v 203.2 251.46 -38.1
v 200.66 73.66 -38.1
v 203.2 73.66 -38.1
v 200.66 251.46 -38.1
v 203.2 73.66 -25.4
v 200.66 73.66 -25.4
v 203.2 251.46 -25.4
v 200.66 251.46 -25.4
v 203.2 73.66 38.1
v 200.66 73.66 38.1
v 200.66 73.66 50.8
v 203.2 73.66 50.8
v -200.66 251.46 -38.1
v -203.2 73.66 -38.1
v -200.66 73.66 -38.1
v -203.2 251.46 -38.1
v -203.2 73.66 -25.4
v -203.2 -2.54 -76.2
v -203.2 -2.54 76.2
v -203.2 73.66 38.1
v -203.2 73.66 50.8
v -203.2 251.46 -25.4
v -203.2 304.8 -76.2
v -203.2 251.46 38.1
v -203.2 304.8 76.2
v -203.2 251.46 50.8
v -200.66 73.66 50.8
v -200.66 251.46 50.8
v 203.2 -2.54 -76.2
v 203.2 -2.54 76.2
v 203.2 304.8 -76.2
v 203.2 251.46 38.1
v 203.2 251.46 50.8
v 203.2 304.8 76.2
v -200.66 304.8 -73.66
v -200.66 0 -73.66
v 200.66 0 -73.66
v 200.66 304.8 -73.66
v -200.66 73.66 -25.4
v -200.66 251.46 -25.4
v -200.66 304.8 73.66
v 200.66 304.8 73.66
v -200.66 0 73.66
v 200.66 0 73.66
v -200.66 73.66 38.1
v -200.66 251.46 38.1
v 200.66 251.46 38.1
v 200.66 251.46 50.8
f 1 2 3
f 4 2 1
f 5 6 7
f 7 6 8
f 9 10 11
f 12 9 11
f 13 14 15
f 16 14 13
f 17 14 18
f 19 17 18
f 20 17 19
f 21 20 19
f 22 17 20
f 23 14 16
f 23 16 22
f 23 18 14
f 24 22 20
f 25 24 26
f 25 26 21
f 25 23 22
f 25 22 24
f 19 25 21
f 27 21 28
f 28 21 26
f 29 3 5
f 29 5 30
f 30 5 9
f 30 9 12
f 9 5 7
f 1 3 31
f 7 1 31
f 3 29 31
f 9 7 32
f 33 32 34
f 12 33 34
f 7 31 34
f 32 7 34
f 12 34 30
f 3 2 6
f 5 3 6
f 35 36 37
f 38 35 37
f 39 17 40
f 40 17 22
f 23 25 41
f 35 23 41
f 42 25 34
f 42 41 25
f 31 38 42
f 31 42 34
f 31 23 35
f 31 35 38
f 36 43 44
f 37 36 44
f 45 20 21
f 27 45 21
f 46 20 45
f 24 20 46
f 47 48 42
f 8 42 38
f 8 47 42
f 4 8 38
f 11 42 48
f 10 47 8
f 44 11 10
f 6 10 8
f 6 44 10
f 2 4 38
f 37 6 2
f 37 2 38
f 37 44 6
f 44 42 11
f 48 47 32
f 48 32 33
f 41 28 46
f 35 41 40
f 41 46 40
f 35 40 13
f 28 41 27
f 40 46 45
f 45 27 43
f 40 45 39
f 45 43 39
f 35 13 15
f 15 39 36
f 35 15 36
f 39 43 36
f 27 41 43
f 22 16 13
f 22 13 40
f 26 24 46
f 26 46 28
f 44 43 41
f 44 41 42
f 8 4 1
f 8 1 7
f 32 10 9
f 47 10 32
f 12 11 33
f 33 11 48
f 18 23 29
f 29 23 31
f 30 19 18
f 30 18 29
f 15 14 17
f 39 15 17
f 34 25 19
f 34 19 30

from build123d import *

# Parameters (mm, degrees)
SKETCH1_W               = 406.4
SKETCH1_H               = 152.4
SKETCH1_W_2             = 401.32
SKETCH1_H_2             = 147.32
BOSS_EXTRUDE1_DEPTH     = 304.8
SKETCH2_W               = 406.4
SKETCH2_H               = 152.4
BOSS_EXTRUDE2_DEPTH     = 2.54
SKETCH3_W               = 12.7
SKETCH3_H               = 177.8
CUT_EXTRUDE1_DEPTH      = 1
CUT_EXTRUDE1_DEPTH_BACK = 407.4


with BuildPart() as part:
    # Sketch1 → Boss-Extrude1 (new body)
    with BuildSketch(Plane(origin=(0, 0, 0), x_dir=(1, 0, 0), z_dir=(0, 1, 0))):
        Rectangle(SKETCH1_W, SKETCH1_H)
        Rectangle(SKETCH1_W_2, SKETCH1_H_2, mode=Mode.SUBTRACT)
    extrude(amount=BOSS_EXTRUDE1_DEPTH)

    # Sketch2 → Boss-Extrude2 (add)
    with BuildSketch(Plane.XZ):
        Rectangle(SKETCH2_W, SKETCH2_H)
    extrude(amount=BOSS_EXTRUDE2_DEPTH)

    # Sketch3 → Cut-Extrude1 (cut, two sides)
    with BuildSketch(Plane.ZY.offset(203.2)) as cut_extrude1_sk:
        with Locations((44.45, 162.56)):
            Rectangle(SKETCH3_W, SKETCH3_H)
        with Locations((-31.75, 162.56)):
            Rectangle(SKETCH3_W, SKETCH3_H)
    extrude(amount=CUT_EXTRUDE1_DEPTH, mode=Mode.SUBTRACT)
    extrude(cut_extrude1_sk.sketch, amount=-CUT_EXTRUDE1_DEPTH_BACK, mode=Mode.SUBTRACT)


solid = part.part
